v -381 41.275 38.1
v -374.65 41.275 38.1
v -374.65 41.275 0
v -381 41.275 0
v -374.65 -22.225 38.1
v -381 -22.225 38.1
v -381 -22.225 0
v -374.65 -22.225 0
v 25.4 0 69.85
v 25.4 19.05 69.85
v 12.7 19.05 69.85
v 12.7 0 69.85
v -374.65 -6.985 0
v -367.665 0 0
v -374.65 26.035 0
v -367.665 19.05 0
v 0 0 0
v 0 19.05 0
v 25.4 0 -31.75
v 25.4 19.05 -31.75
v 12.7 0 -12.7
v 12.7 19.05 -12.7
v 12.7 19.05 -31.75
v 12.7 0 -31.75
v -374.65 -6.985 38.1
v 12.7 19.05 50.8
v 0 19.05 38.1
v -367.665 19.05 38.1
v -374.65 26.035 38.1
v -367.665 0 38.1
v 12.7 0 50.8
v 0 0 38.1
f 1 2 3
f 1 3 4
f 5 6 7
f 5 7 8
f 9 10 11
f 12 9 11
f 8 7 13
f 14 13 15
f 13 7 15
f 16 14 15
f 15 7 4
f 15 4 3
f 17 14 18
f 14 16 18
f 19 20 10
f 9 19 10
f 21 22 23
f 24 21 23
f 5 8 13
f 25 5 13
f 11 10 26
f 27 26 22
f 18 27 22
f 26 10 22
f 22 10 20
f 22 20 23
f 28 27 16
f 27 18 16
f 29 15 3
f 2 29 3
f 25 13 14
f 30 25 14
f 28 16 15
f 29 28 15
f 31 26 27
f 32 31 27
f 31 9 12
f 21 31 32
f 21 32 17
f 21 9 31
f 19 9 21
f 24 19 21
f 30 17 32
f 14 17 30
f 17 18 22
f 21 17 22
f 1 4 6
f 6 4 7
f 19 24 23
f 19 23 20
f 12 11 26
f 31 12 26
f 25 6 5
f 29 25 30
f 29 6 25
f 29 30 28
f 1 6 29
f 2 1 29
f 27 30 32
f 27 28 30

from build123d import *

# Parameters (mm, degrees)
BOSS_EXTRUDE1_DEPTH = 38.1
BOSS_EXTRUDE2_DEPTH = 19.05


with BuildPart() as part:
    # Sketch3 → Boss-Extrude1 (new body)
    with BuildSketch(Plane.XY):
        Polygon((0, 0), (0, 19.05), (-367.665, 19.05), (-374.65, 26.035), (-374.65, 41.275), (-381, 41.275), (-381, -22.225), (-374.65, -22.225), (-374.65, -6.985), (-367.665, 0), align=None)
    extrude(amount=BOSS_EXTRUDE1_DEPTH)

    # Sketch4 → Boss-Extrude2 (add)
    with BuildSketch(Plane(origin=(0, 19.05, 0), x_dir=(1, 0, 0), z_dir=(0, 1, 0))):
        Polygon((0, 0), (12.7, 12.7), (12.7, 31.75), (25.4, 31.75), (25.4, -69.85), (12.7, -69.85), (12.7, -50.8), (0, -38.1), align=None)
    extrude(amount=-BOSS_EXTRUDE2_DEPTH)


solid = part.part
